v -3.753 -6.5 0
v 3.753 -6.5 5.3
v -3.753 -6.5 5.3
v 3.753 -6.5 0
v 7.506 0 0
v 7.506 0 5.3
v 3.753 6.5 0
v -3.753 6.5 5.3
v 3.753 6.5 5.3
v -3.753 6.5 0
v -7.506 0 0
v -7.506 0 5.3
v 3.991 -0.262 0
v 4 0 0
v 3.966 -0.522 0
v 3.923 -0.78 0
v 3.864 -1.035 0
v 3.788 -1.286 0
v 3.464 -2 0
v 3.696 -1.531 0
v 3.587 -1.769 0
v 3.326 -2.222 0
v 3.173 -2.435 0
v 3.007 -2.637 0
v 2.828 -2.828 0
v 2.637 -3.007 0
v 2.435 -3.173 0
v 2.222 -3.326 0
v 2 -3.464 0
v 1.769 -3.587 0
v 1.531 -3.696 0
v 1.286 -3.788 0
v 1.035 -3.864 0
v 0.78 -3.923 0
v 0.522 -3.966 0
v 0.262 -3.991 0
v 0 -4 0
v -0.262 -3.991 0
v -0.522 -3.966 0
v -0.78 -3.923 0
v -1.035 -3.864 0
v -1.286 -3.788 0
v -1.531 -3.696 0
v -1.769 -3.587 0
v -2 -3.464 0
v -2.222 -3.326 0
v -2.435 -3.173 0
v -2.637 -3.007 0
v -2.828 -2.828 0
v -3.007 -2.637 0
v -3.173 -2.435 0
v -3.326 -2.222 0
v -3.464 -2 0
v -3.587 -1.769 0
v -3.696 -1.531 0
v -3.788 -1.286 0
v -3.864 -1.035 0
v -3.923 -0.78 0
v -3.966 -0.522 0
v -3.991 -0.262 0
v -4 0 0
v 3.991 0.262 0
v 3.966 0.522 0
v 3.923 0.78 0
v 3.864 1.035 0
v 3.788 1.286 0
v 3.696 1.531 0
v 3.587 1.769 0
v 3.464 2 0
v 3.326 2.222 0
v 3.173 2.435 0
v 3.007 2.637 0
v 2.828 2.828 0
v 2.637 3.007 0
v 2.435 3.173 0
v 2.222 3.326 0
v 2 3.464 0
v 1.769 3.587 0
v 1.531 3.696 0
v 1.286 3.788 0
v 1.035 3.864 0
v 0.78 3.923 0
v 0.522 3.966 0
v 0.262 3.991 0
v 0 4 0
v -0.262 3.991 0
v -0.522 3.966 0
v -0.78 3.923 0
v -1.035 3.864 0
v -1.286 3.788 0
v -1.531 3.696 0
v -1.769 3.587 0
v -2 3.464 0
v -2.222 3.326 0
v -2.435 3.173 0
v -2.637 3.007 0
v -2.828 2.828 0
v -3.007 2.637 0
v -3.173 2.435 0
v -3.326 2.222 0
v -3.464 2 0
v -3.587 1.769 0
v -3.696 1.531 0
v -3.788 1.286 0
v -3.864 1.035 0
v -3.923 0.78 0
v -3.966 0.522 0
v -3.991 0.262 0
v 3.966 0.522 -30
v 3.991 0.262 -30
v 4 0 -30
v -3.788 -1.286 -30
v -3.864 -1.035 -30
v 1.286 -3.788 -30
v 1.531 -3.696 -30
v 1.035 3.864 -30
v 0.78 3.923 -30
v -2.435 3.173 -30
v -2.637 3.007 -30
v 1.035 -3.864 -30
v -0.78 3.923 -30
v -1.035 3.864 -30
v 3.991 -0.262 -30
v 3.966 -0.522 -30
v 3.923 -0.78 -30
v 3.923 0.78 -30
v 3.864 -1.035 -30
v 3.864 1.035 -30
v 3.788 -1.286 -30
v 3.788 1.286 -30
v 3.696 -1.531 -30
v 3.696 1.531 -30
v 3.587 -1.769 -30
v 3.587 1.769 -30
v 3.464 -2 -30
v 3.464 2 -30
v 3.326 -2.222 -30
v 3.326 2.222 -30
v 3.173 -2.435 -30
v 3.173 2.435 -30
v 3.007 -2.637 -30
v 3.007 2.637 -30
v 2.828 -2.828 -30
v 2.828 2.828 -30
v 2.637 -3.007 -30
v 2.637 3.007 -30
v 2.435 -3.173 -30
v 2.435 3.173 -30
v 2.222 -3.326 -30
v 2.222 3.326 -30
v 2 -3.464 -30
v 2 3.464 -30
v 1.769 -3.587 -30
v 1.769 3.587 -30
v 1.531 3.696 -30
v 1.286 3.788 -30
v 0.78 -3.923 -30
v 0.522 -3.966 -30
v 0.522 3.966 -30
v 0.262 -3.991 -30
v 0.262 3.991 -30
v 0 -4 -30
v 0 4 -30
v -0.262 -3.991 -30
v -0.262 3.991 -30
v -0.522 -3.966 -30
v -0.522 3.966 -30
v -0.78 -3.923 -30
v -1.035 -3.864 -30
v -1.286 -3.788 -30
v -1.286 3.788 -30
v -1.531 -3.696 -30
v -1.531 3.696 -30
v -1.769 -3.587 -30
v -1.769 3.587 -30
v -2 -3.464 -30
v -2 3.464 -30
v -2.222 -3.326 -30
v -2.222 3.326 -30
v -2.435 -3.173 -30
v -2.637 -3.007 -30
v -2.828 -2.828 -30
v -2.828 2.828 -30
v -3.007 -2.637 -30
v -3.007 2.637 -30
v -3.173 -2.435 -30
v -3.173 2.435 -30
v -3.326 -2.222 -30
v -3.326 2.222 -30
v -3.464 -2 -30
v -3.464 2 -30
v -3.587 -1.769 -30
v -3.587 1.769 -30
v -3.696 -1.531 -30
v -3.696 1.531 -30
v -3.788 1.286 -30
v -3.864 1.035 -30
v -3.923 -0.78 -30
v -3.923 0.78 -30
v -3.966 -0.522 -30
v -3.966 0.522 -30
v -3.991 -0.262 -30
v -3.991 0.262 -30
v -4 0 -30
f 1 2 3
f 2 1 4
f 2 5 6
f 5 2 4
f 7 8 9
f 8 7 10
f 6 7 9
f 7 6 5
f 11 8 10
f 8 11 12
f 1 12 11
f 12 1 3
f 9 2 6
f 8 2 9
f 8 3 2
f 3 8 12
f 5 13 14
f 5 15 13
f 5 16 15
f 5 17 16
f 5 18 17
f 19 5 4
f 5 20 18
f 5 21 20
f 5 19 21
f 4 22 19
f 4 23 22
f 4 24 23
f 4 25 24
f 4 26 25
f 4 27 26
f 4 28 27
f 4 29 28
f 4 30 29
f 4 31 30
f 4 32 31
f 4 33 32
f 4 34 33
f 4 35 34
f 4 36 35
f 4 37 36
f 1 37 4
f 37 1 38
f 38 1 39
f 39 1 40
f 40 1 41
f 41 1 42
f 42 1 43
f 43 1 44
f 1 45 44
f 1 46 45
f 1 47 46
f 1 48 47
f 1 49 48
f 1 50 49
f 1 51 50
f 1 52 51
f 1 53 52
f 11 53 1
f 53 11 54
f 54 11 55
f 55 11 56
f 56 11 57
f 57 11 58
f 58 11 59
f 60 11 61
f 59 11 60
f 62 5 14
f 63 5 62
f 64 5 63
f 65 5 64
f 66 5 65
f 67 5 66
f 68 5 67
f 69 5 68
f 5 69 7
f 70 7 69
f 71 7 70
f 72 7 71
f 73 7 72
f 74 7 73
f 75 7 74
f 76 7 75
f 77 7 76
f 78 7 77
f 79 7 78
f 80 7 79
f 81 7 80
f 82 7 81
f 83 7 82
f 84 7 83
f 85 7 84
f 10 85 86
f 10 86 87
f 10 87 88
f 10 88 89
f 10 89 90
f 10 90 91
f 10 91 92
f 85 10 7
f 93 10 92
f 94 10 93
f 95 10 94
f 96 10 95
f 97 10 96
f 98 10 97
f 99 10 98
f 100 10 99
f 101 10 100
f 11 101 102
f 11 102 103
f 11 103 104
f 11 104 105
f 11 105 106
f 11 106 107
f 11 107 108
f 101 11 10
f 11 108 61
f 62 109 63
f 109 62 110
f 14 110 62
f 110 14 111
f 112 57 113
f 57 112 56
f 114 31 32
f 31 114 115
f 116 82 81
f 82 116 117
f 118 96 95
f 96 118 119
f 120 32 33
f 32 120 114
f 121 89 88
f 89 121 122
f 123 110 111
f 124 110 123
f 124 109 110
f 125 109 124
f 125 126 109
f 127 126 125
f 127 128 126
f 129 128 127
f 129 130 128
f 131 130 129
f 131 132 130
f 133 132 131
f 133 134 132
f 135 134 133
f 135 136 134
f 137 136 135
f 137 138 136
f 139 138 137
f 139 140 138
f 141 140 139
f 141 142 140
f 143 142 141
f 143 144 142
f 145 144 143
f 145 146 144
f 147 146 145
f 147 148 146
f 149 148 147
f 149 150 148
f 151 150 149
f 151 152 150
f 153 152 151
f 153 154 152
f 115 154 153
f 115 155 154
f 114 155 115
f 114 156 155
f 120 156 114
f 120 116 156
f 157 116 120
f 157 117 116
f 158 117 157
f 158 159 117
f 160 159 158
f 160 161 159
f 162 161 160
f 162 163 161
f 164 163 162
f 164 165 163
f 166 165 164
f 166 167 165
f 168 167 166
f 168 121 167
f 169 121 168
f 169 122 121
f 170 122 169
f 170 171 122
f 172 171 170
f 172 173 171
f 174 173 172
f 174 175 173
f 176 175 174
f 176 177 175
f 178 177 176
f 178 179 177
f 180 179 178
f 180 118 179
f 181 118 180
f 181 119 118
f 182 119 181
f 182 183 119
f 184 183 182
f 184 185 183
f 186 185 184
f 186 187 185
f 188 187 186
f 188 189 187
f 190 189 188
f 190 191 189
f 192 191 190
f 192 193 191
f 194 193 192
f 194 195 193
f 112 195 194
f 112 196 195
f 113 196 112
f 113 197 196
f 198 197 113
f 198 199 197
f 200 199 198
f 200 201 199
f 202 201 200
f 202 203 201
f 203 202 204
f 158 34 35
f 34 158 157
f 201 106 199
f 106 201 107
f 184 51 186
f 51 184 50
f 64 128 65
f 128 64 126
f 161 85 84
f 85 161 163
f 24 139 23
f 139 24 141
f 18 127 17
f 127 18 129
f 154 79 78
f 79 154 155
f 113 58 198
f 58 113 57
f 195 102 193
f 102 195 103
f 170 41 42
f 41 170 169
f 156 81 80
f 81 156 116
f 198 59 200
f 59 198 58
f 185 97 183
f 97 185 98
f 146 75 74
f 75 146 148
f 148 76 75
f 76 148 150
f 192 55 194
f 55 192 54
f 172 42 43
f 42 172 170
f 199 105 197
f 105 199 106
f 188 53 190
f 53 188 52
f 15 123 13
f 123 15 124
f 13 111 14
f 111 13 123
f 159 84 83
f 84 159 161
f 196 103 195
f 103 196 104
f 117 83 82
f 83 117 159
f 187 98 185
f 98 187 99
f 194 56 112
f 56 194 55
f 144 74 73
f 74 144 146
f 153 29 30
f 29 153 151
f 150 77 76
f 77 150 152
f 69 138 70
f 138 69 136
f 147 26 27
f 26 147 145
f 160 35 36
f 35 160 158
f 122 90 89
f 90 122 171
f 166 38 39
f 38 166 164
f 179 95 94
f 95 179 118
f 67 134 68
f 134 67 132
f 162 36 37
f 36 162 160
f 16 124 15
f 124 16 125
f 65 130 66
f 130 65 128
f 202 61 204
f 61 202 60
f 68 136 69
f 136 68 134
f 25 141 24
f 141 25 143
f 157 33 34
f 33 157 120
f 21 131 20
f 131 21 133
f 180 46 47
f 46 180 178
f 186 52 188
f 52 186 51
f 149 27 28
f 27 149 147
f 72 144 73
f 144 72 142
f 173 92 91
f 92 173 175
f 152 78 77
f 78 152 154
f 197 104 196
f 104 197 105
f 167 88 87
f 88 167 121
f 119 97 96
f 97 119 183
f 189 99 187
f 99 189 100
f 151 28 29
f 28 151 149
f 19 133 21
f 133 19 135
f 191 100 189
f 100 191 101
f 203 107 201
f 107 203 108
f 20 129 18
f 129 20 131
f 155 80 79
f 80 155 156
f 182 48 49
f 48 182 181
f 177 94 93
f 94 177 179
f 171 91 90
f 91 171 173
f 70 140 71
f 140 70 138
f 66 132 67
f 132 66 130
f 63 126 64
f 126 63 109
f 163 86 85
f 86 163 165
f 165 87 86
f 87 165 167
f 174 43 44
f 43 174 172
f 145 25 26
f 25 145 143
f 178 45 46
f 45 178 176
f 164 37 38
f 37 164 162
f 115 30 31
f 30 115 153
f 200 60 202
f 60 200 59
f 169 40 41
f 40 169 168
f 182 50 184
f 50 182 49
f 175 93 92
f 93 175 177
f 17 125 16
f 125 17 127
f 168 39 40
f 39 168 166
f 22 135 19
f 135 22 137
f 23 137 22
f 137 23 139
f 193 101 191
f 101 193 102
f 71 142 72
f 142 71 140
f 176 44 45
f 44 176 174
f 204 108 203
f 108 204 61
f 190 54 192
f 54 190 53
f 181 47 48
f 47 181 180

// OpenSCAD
head_across_flats = 13;
head_height = 5.3;
shank_diameter = 8;
shank_length = 30;

union() {
    cylinder(
        h = head_height,
        d = head_across_flats / cos(30),
        $fn = 6
    );

    translate([0, 0, -shank_length])
        cylinder(
            h = shank_length,
            d = shank_diameter,
            $fn = 96
        );
}
